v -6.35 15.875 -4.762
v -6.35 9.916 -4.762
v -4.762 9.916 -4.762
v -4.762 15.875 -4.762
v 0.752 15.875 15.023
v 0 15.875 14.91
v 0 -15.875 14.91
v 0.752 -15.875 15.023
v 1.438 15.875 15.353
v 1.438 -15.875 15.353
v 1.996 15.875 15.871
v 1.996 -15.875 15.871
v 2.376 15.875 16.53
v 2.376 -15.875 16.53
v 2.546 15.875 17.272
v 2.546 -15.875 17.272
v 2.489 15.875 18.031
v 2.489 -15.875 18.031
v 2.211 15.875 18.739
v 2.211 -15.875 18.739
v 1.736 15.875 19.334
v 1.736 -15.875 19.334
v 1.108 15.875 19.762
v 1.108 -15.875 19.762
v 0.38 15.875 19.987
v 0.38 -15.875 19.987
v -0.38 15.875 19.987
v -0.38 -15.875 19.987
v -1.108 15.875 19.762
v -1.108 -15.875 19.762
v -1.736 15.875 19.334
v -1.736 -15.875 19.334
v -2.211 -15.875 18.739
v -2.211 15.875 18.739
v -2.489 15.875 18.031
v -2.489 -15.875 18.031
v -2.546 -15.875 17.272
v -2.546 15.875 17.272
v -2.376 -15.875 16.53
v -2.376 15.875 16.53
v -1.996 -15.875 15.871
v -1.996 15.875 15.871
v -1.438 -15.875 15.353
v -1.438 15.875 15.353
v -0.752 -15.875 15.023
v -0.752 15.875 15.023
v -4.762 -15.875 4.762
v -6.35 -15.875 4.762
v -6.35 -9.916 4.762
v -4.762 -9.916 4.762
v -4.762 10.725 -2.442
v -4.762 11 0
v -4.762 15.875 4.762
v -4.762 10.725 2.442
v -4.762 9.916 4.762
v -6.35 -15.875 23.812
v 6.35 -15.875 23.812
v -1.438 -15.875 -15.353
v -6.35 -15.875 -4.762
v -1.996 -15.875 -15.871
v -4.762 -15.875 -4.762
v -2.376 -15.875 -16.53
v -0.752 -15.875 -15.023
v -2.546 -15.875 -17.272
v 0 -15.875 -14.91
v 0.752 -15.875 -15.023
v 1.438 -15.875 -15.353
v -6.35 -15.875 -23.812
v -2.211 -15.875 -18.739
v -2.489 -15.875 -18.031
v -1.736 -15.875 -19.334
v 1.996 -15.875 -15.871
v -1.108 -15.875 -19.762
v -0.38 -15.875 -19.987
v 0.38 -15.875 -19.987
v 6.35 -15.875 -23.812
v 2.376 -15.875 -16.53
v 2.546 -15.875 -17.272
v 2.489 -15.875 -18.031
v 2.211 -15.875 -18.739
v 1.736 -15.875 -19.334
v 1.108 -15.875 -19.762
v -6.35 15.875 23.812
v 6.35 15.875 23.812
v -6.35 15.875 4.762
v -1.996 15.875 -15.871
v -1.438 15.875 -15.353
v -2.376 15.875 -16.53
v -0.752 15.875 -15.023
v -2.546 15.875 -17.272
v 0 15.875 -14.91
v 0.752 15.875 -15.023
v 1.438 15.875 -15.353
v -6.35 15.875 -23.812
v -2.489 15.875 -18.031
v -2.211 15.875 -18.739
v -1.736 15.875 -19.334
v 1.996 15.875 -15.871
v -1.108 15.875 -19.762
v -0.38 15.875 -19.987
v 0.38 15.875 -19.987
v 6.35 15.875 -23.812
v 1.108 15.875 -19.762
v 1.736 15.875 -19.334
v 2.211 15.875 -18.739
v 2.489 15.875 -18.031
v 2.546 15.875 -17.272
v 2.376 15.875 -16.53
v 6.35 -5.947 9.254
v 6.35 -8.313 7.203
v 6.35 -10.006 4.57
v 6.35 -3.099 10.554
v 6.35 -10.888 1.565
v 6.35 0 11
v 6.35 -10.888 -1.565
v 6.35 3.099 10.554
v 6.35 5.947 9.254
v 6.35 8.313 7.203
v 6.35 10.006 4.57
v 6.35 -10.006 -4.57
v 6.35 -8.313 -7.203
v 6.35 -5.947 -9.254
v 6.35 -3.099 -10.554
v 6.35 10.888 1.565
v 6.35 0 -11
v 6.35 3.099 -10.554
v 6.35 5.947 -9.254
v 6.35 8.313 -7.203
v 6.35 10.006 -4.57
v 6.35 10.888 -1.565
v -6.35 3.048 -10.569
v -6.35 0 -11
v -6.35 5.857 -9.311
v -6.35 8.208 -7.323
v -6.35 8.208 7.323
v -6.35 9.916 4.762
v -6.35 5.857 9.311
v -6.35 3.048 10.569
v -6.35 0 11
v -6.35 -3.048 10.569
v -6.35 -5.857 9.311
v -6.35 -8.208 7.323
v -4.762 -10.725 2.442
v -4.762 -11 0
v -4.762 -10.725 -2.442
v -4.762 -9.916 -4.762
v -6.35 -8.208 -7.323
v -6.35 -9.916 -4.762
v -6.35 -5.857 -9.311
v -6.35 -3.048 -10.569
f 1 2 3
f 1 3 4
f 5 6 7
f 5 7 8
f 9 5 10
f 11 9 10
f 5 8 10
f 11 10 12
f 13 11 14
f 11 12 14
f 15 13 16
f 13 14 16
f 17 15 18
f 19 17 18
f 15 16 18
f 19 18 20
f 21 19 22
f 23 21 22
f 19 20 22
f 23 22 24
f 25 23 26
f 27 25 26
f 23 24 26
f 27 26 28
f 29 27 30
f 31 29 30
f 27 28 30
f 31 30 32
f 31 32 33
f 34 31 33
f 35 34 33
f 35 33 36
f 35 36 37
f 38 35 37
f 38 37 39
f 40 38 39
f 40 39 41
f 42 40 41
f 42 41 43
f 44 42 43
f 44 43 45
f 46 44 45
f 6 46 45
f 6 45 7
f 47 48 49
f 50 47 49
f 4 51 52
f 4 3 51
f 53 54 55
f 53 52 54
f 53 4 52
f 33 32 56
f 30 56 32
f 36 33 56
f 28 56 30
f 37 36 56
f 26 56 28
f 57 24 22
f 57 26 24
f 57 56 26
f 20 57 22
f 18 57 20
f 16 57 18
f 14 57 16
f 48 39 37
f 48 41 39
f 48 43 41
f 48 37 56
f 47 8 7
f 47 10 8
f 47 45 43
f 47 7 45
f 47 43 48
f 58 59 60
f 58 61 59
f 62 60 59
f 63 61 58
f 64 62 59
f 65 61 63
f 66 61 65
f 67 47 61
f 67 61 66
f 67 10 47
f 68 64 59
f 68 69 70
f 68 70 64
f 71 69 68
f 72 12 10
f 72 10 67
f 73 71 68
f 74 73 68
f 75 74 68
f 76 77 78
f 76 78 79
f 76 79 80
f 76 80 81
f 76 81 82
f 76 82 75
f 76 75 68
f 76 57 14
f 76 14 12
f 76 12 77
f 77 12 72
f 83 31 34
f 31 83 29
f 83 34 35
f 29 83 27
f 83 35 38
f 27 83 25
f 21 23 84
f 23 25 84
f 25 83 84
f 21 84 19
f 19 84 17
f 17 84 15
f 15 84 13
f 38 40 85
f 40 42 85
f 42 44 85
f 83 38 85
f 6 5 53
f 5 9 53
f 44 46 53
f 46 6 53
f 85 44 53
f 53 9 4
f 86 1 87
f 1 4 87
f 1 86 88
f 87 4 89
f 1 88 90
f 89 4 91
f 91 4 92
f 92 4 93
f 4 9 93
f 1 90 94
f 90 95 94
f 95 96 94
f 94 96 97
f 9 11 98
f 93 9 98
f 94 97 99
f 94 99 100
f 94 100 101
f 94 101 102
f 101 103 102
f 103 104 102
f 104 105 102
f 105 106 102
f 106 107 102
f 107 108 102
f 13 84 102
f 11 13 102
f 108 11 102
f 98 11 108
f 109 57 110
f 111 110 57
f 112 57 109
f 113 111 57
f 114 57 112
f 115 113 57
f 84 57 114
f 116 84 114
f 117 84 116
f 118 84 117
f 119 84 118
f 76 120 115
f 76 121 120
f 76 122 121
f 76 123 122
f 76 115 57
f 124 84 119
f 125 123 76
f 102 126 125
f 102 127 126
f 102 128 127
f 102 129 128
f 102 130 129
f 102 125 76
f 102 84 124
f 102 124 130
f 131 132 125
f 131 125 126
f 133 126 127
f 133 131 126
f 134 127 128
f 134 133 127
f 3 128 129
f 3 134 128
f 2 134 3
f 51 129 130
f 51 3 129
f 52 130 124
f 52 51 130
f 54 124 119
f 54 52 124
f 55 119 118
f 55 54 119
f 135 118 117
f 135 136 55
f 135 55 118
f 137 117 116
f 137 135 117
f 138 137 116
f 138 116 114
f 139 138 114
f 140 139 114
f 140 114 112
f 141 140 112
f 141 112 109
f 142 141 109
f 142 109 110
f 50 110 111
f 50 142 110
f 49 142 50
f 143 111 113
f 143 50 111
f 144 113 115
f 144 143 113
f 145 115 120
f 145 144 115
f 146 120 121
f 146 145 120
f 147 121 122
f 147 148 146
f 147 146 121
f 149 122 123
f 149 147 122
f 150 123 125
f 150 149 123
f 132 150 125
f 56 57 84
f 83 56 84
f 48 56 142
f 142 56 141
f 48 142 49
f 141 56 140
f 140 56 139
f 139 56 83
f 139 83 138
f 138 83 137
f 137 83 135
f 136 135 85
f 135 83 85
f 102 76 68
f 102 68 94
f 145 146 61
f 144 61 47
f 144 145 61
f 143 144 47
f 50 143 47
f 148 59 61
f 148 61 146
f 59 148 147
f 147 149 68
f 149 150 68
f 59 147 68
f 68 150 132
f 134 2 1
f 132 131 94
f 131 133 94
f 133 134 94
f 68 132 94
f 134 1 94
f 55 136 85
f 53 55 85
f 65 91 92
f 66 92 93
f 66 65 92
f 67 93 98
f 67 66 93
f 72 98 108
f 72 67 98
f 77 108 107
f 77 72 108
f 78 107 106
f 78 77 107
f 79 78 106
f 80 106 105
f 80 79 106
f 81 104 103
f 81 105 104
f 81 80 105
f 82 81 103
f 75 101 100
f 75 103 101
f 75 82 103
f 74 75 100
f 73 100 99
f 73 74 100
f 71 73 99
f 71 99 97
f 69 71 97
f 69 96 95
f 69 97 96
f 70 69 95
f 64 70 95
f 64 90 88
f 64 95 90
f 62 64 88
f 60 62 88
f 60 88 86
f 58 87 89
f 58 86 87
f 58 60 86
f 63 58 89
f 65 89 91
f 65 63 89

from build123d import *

# Parameters (mm, degrees)
SKETCH1_W           = 47.625
SKETCH1_H           = 31.75
SKETCH1_R           = 11
BOSS_EXTRUDE1_DEPTH = 6.35
SKETCH3_R           = 2.5527
CUT_EXTRUDE2_DEPTH  = 41.192289761
SKETCH4_W           = 9.525
SKETCH4_H           = 35.649275258
CUT_EXTRUDE3_DEPTH  = 1.5875


with BuildPart() as part:
    # Sketch1 → Boss-Extrude1 (new, symmetric)
    with BuildSketch(Plane(origin=(0, 0, 0), x_dir=(0, 0, -1), z_dir=(1, 0, 0))):
        Rectangle(SKETCH1_W, SKETCH1_H)
        Circle(SKETCH1_R, mode=Mode.SUBTRACT)
    extrude(amount=BOSS_EXTRUDE1_DEPTH, both=True)

    # Sketch3 → Cut-Extrude2 (cut, through all)
    with BuildSketch(Plane.XZ.offset(15.875)):
        with Locations(Location((0, 17.4625, 0), (0, 0, 270))):
            Circle(SKETCH3_R)
    cut_extrude2 = extrude(amount=-CUT_EXTRUDE2_DEPTH, mode=Mode.SUBTRACT)

    # Mirror1: Cut-Extrude2 across plane
    add(cut_extrude2.mirror(Plane.XY), mode=Mode.SUBTRACT)

    # Sketch4 → Cut-Extrude3 (cut)
    with BuildSketch(Plane.ZY.offset(6.35)):
        Rectangle(SKETCH4_W, SKETCH4_H)
    extrude(amount=-CUT_EXTRUDE3_DEPTH, mode=Mode.SUBTRACT)


solid = part.part
